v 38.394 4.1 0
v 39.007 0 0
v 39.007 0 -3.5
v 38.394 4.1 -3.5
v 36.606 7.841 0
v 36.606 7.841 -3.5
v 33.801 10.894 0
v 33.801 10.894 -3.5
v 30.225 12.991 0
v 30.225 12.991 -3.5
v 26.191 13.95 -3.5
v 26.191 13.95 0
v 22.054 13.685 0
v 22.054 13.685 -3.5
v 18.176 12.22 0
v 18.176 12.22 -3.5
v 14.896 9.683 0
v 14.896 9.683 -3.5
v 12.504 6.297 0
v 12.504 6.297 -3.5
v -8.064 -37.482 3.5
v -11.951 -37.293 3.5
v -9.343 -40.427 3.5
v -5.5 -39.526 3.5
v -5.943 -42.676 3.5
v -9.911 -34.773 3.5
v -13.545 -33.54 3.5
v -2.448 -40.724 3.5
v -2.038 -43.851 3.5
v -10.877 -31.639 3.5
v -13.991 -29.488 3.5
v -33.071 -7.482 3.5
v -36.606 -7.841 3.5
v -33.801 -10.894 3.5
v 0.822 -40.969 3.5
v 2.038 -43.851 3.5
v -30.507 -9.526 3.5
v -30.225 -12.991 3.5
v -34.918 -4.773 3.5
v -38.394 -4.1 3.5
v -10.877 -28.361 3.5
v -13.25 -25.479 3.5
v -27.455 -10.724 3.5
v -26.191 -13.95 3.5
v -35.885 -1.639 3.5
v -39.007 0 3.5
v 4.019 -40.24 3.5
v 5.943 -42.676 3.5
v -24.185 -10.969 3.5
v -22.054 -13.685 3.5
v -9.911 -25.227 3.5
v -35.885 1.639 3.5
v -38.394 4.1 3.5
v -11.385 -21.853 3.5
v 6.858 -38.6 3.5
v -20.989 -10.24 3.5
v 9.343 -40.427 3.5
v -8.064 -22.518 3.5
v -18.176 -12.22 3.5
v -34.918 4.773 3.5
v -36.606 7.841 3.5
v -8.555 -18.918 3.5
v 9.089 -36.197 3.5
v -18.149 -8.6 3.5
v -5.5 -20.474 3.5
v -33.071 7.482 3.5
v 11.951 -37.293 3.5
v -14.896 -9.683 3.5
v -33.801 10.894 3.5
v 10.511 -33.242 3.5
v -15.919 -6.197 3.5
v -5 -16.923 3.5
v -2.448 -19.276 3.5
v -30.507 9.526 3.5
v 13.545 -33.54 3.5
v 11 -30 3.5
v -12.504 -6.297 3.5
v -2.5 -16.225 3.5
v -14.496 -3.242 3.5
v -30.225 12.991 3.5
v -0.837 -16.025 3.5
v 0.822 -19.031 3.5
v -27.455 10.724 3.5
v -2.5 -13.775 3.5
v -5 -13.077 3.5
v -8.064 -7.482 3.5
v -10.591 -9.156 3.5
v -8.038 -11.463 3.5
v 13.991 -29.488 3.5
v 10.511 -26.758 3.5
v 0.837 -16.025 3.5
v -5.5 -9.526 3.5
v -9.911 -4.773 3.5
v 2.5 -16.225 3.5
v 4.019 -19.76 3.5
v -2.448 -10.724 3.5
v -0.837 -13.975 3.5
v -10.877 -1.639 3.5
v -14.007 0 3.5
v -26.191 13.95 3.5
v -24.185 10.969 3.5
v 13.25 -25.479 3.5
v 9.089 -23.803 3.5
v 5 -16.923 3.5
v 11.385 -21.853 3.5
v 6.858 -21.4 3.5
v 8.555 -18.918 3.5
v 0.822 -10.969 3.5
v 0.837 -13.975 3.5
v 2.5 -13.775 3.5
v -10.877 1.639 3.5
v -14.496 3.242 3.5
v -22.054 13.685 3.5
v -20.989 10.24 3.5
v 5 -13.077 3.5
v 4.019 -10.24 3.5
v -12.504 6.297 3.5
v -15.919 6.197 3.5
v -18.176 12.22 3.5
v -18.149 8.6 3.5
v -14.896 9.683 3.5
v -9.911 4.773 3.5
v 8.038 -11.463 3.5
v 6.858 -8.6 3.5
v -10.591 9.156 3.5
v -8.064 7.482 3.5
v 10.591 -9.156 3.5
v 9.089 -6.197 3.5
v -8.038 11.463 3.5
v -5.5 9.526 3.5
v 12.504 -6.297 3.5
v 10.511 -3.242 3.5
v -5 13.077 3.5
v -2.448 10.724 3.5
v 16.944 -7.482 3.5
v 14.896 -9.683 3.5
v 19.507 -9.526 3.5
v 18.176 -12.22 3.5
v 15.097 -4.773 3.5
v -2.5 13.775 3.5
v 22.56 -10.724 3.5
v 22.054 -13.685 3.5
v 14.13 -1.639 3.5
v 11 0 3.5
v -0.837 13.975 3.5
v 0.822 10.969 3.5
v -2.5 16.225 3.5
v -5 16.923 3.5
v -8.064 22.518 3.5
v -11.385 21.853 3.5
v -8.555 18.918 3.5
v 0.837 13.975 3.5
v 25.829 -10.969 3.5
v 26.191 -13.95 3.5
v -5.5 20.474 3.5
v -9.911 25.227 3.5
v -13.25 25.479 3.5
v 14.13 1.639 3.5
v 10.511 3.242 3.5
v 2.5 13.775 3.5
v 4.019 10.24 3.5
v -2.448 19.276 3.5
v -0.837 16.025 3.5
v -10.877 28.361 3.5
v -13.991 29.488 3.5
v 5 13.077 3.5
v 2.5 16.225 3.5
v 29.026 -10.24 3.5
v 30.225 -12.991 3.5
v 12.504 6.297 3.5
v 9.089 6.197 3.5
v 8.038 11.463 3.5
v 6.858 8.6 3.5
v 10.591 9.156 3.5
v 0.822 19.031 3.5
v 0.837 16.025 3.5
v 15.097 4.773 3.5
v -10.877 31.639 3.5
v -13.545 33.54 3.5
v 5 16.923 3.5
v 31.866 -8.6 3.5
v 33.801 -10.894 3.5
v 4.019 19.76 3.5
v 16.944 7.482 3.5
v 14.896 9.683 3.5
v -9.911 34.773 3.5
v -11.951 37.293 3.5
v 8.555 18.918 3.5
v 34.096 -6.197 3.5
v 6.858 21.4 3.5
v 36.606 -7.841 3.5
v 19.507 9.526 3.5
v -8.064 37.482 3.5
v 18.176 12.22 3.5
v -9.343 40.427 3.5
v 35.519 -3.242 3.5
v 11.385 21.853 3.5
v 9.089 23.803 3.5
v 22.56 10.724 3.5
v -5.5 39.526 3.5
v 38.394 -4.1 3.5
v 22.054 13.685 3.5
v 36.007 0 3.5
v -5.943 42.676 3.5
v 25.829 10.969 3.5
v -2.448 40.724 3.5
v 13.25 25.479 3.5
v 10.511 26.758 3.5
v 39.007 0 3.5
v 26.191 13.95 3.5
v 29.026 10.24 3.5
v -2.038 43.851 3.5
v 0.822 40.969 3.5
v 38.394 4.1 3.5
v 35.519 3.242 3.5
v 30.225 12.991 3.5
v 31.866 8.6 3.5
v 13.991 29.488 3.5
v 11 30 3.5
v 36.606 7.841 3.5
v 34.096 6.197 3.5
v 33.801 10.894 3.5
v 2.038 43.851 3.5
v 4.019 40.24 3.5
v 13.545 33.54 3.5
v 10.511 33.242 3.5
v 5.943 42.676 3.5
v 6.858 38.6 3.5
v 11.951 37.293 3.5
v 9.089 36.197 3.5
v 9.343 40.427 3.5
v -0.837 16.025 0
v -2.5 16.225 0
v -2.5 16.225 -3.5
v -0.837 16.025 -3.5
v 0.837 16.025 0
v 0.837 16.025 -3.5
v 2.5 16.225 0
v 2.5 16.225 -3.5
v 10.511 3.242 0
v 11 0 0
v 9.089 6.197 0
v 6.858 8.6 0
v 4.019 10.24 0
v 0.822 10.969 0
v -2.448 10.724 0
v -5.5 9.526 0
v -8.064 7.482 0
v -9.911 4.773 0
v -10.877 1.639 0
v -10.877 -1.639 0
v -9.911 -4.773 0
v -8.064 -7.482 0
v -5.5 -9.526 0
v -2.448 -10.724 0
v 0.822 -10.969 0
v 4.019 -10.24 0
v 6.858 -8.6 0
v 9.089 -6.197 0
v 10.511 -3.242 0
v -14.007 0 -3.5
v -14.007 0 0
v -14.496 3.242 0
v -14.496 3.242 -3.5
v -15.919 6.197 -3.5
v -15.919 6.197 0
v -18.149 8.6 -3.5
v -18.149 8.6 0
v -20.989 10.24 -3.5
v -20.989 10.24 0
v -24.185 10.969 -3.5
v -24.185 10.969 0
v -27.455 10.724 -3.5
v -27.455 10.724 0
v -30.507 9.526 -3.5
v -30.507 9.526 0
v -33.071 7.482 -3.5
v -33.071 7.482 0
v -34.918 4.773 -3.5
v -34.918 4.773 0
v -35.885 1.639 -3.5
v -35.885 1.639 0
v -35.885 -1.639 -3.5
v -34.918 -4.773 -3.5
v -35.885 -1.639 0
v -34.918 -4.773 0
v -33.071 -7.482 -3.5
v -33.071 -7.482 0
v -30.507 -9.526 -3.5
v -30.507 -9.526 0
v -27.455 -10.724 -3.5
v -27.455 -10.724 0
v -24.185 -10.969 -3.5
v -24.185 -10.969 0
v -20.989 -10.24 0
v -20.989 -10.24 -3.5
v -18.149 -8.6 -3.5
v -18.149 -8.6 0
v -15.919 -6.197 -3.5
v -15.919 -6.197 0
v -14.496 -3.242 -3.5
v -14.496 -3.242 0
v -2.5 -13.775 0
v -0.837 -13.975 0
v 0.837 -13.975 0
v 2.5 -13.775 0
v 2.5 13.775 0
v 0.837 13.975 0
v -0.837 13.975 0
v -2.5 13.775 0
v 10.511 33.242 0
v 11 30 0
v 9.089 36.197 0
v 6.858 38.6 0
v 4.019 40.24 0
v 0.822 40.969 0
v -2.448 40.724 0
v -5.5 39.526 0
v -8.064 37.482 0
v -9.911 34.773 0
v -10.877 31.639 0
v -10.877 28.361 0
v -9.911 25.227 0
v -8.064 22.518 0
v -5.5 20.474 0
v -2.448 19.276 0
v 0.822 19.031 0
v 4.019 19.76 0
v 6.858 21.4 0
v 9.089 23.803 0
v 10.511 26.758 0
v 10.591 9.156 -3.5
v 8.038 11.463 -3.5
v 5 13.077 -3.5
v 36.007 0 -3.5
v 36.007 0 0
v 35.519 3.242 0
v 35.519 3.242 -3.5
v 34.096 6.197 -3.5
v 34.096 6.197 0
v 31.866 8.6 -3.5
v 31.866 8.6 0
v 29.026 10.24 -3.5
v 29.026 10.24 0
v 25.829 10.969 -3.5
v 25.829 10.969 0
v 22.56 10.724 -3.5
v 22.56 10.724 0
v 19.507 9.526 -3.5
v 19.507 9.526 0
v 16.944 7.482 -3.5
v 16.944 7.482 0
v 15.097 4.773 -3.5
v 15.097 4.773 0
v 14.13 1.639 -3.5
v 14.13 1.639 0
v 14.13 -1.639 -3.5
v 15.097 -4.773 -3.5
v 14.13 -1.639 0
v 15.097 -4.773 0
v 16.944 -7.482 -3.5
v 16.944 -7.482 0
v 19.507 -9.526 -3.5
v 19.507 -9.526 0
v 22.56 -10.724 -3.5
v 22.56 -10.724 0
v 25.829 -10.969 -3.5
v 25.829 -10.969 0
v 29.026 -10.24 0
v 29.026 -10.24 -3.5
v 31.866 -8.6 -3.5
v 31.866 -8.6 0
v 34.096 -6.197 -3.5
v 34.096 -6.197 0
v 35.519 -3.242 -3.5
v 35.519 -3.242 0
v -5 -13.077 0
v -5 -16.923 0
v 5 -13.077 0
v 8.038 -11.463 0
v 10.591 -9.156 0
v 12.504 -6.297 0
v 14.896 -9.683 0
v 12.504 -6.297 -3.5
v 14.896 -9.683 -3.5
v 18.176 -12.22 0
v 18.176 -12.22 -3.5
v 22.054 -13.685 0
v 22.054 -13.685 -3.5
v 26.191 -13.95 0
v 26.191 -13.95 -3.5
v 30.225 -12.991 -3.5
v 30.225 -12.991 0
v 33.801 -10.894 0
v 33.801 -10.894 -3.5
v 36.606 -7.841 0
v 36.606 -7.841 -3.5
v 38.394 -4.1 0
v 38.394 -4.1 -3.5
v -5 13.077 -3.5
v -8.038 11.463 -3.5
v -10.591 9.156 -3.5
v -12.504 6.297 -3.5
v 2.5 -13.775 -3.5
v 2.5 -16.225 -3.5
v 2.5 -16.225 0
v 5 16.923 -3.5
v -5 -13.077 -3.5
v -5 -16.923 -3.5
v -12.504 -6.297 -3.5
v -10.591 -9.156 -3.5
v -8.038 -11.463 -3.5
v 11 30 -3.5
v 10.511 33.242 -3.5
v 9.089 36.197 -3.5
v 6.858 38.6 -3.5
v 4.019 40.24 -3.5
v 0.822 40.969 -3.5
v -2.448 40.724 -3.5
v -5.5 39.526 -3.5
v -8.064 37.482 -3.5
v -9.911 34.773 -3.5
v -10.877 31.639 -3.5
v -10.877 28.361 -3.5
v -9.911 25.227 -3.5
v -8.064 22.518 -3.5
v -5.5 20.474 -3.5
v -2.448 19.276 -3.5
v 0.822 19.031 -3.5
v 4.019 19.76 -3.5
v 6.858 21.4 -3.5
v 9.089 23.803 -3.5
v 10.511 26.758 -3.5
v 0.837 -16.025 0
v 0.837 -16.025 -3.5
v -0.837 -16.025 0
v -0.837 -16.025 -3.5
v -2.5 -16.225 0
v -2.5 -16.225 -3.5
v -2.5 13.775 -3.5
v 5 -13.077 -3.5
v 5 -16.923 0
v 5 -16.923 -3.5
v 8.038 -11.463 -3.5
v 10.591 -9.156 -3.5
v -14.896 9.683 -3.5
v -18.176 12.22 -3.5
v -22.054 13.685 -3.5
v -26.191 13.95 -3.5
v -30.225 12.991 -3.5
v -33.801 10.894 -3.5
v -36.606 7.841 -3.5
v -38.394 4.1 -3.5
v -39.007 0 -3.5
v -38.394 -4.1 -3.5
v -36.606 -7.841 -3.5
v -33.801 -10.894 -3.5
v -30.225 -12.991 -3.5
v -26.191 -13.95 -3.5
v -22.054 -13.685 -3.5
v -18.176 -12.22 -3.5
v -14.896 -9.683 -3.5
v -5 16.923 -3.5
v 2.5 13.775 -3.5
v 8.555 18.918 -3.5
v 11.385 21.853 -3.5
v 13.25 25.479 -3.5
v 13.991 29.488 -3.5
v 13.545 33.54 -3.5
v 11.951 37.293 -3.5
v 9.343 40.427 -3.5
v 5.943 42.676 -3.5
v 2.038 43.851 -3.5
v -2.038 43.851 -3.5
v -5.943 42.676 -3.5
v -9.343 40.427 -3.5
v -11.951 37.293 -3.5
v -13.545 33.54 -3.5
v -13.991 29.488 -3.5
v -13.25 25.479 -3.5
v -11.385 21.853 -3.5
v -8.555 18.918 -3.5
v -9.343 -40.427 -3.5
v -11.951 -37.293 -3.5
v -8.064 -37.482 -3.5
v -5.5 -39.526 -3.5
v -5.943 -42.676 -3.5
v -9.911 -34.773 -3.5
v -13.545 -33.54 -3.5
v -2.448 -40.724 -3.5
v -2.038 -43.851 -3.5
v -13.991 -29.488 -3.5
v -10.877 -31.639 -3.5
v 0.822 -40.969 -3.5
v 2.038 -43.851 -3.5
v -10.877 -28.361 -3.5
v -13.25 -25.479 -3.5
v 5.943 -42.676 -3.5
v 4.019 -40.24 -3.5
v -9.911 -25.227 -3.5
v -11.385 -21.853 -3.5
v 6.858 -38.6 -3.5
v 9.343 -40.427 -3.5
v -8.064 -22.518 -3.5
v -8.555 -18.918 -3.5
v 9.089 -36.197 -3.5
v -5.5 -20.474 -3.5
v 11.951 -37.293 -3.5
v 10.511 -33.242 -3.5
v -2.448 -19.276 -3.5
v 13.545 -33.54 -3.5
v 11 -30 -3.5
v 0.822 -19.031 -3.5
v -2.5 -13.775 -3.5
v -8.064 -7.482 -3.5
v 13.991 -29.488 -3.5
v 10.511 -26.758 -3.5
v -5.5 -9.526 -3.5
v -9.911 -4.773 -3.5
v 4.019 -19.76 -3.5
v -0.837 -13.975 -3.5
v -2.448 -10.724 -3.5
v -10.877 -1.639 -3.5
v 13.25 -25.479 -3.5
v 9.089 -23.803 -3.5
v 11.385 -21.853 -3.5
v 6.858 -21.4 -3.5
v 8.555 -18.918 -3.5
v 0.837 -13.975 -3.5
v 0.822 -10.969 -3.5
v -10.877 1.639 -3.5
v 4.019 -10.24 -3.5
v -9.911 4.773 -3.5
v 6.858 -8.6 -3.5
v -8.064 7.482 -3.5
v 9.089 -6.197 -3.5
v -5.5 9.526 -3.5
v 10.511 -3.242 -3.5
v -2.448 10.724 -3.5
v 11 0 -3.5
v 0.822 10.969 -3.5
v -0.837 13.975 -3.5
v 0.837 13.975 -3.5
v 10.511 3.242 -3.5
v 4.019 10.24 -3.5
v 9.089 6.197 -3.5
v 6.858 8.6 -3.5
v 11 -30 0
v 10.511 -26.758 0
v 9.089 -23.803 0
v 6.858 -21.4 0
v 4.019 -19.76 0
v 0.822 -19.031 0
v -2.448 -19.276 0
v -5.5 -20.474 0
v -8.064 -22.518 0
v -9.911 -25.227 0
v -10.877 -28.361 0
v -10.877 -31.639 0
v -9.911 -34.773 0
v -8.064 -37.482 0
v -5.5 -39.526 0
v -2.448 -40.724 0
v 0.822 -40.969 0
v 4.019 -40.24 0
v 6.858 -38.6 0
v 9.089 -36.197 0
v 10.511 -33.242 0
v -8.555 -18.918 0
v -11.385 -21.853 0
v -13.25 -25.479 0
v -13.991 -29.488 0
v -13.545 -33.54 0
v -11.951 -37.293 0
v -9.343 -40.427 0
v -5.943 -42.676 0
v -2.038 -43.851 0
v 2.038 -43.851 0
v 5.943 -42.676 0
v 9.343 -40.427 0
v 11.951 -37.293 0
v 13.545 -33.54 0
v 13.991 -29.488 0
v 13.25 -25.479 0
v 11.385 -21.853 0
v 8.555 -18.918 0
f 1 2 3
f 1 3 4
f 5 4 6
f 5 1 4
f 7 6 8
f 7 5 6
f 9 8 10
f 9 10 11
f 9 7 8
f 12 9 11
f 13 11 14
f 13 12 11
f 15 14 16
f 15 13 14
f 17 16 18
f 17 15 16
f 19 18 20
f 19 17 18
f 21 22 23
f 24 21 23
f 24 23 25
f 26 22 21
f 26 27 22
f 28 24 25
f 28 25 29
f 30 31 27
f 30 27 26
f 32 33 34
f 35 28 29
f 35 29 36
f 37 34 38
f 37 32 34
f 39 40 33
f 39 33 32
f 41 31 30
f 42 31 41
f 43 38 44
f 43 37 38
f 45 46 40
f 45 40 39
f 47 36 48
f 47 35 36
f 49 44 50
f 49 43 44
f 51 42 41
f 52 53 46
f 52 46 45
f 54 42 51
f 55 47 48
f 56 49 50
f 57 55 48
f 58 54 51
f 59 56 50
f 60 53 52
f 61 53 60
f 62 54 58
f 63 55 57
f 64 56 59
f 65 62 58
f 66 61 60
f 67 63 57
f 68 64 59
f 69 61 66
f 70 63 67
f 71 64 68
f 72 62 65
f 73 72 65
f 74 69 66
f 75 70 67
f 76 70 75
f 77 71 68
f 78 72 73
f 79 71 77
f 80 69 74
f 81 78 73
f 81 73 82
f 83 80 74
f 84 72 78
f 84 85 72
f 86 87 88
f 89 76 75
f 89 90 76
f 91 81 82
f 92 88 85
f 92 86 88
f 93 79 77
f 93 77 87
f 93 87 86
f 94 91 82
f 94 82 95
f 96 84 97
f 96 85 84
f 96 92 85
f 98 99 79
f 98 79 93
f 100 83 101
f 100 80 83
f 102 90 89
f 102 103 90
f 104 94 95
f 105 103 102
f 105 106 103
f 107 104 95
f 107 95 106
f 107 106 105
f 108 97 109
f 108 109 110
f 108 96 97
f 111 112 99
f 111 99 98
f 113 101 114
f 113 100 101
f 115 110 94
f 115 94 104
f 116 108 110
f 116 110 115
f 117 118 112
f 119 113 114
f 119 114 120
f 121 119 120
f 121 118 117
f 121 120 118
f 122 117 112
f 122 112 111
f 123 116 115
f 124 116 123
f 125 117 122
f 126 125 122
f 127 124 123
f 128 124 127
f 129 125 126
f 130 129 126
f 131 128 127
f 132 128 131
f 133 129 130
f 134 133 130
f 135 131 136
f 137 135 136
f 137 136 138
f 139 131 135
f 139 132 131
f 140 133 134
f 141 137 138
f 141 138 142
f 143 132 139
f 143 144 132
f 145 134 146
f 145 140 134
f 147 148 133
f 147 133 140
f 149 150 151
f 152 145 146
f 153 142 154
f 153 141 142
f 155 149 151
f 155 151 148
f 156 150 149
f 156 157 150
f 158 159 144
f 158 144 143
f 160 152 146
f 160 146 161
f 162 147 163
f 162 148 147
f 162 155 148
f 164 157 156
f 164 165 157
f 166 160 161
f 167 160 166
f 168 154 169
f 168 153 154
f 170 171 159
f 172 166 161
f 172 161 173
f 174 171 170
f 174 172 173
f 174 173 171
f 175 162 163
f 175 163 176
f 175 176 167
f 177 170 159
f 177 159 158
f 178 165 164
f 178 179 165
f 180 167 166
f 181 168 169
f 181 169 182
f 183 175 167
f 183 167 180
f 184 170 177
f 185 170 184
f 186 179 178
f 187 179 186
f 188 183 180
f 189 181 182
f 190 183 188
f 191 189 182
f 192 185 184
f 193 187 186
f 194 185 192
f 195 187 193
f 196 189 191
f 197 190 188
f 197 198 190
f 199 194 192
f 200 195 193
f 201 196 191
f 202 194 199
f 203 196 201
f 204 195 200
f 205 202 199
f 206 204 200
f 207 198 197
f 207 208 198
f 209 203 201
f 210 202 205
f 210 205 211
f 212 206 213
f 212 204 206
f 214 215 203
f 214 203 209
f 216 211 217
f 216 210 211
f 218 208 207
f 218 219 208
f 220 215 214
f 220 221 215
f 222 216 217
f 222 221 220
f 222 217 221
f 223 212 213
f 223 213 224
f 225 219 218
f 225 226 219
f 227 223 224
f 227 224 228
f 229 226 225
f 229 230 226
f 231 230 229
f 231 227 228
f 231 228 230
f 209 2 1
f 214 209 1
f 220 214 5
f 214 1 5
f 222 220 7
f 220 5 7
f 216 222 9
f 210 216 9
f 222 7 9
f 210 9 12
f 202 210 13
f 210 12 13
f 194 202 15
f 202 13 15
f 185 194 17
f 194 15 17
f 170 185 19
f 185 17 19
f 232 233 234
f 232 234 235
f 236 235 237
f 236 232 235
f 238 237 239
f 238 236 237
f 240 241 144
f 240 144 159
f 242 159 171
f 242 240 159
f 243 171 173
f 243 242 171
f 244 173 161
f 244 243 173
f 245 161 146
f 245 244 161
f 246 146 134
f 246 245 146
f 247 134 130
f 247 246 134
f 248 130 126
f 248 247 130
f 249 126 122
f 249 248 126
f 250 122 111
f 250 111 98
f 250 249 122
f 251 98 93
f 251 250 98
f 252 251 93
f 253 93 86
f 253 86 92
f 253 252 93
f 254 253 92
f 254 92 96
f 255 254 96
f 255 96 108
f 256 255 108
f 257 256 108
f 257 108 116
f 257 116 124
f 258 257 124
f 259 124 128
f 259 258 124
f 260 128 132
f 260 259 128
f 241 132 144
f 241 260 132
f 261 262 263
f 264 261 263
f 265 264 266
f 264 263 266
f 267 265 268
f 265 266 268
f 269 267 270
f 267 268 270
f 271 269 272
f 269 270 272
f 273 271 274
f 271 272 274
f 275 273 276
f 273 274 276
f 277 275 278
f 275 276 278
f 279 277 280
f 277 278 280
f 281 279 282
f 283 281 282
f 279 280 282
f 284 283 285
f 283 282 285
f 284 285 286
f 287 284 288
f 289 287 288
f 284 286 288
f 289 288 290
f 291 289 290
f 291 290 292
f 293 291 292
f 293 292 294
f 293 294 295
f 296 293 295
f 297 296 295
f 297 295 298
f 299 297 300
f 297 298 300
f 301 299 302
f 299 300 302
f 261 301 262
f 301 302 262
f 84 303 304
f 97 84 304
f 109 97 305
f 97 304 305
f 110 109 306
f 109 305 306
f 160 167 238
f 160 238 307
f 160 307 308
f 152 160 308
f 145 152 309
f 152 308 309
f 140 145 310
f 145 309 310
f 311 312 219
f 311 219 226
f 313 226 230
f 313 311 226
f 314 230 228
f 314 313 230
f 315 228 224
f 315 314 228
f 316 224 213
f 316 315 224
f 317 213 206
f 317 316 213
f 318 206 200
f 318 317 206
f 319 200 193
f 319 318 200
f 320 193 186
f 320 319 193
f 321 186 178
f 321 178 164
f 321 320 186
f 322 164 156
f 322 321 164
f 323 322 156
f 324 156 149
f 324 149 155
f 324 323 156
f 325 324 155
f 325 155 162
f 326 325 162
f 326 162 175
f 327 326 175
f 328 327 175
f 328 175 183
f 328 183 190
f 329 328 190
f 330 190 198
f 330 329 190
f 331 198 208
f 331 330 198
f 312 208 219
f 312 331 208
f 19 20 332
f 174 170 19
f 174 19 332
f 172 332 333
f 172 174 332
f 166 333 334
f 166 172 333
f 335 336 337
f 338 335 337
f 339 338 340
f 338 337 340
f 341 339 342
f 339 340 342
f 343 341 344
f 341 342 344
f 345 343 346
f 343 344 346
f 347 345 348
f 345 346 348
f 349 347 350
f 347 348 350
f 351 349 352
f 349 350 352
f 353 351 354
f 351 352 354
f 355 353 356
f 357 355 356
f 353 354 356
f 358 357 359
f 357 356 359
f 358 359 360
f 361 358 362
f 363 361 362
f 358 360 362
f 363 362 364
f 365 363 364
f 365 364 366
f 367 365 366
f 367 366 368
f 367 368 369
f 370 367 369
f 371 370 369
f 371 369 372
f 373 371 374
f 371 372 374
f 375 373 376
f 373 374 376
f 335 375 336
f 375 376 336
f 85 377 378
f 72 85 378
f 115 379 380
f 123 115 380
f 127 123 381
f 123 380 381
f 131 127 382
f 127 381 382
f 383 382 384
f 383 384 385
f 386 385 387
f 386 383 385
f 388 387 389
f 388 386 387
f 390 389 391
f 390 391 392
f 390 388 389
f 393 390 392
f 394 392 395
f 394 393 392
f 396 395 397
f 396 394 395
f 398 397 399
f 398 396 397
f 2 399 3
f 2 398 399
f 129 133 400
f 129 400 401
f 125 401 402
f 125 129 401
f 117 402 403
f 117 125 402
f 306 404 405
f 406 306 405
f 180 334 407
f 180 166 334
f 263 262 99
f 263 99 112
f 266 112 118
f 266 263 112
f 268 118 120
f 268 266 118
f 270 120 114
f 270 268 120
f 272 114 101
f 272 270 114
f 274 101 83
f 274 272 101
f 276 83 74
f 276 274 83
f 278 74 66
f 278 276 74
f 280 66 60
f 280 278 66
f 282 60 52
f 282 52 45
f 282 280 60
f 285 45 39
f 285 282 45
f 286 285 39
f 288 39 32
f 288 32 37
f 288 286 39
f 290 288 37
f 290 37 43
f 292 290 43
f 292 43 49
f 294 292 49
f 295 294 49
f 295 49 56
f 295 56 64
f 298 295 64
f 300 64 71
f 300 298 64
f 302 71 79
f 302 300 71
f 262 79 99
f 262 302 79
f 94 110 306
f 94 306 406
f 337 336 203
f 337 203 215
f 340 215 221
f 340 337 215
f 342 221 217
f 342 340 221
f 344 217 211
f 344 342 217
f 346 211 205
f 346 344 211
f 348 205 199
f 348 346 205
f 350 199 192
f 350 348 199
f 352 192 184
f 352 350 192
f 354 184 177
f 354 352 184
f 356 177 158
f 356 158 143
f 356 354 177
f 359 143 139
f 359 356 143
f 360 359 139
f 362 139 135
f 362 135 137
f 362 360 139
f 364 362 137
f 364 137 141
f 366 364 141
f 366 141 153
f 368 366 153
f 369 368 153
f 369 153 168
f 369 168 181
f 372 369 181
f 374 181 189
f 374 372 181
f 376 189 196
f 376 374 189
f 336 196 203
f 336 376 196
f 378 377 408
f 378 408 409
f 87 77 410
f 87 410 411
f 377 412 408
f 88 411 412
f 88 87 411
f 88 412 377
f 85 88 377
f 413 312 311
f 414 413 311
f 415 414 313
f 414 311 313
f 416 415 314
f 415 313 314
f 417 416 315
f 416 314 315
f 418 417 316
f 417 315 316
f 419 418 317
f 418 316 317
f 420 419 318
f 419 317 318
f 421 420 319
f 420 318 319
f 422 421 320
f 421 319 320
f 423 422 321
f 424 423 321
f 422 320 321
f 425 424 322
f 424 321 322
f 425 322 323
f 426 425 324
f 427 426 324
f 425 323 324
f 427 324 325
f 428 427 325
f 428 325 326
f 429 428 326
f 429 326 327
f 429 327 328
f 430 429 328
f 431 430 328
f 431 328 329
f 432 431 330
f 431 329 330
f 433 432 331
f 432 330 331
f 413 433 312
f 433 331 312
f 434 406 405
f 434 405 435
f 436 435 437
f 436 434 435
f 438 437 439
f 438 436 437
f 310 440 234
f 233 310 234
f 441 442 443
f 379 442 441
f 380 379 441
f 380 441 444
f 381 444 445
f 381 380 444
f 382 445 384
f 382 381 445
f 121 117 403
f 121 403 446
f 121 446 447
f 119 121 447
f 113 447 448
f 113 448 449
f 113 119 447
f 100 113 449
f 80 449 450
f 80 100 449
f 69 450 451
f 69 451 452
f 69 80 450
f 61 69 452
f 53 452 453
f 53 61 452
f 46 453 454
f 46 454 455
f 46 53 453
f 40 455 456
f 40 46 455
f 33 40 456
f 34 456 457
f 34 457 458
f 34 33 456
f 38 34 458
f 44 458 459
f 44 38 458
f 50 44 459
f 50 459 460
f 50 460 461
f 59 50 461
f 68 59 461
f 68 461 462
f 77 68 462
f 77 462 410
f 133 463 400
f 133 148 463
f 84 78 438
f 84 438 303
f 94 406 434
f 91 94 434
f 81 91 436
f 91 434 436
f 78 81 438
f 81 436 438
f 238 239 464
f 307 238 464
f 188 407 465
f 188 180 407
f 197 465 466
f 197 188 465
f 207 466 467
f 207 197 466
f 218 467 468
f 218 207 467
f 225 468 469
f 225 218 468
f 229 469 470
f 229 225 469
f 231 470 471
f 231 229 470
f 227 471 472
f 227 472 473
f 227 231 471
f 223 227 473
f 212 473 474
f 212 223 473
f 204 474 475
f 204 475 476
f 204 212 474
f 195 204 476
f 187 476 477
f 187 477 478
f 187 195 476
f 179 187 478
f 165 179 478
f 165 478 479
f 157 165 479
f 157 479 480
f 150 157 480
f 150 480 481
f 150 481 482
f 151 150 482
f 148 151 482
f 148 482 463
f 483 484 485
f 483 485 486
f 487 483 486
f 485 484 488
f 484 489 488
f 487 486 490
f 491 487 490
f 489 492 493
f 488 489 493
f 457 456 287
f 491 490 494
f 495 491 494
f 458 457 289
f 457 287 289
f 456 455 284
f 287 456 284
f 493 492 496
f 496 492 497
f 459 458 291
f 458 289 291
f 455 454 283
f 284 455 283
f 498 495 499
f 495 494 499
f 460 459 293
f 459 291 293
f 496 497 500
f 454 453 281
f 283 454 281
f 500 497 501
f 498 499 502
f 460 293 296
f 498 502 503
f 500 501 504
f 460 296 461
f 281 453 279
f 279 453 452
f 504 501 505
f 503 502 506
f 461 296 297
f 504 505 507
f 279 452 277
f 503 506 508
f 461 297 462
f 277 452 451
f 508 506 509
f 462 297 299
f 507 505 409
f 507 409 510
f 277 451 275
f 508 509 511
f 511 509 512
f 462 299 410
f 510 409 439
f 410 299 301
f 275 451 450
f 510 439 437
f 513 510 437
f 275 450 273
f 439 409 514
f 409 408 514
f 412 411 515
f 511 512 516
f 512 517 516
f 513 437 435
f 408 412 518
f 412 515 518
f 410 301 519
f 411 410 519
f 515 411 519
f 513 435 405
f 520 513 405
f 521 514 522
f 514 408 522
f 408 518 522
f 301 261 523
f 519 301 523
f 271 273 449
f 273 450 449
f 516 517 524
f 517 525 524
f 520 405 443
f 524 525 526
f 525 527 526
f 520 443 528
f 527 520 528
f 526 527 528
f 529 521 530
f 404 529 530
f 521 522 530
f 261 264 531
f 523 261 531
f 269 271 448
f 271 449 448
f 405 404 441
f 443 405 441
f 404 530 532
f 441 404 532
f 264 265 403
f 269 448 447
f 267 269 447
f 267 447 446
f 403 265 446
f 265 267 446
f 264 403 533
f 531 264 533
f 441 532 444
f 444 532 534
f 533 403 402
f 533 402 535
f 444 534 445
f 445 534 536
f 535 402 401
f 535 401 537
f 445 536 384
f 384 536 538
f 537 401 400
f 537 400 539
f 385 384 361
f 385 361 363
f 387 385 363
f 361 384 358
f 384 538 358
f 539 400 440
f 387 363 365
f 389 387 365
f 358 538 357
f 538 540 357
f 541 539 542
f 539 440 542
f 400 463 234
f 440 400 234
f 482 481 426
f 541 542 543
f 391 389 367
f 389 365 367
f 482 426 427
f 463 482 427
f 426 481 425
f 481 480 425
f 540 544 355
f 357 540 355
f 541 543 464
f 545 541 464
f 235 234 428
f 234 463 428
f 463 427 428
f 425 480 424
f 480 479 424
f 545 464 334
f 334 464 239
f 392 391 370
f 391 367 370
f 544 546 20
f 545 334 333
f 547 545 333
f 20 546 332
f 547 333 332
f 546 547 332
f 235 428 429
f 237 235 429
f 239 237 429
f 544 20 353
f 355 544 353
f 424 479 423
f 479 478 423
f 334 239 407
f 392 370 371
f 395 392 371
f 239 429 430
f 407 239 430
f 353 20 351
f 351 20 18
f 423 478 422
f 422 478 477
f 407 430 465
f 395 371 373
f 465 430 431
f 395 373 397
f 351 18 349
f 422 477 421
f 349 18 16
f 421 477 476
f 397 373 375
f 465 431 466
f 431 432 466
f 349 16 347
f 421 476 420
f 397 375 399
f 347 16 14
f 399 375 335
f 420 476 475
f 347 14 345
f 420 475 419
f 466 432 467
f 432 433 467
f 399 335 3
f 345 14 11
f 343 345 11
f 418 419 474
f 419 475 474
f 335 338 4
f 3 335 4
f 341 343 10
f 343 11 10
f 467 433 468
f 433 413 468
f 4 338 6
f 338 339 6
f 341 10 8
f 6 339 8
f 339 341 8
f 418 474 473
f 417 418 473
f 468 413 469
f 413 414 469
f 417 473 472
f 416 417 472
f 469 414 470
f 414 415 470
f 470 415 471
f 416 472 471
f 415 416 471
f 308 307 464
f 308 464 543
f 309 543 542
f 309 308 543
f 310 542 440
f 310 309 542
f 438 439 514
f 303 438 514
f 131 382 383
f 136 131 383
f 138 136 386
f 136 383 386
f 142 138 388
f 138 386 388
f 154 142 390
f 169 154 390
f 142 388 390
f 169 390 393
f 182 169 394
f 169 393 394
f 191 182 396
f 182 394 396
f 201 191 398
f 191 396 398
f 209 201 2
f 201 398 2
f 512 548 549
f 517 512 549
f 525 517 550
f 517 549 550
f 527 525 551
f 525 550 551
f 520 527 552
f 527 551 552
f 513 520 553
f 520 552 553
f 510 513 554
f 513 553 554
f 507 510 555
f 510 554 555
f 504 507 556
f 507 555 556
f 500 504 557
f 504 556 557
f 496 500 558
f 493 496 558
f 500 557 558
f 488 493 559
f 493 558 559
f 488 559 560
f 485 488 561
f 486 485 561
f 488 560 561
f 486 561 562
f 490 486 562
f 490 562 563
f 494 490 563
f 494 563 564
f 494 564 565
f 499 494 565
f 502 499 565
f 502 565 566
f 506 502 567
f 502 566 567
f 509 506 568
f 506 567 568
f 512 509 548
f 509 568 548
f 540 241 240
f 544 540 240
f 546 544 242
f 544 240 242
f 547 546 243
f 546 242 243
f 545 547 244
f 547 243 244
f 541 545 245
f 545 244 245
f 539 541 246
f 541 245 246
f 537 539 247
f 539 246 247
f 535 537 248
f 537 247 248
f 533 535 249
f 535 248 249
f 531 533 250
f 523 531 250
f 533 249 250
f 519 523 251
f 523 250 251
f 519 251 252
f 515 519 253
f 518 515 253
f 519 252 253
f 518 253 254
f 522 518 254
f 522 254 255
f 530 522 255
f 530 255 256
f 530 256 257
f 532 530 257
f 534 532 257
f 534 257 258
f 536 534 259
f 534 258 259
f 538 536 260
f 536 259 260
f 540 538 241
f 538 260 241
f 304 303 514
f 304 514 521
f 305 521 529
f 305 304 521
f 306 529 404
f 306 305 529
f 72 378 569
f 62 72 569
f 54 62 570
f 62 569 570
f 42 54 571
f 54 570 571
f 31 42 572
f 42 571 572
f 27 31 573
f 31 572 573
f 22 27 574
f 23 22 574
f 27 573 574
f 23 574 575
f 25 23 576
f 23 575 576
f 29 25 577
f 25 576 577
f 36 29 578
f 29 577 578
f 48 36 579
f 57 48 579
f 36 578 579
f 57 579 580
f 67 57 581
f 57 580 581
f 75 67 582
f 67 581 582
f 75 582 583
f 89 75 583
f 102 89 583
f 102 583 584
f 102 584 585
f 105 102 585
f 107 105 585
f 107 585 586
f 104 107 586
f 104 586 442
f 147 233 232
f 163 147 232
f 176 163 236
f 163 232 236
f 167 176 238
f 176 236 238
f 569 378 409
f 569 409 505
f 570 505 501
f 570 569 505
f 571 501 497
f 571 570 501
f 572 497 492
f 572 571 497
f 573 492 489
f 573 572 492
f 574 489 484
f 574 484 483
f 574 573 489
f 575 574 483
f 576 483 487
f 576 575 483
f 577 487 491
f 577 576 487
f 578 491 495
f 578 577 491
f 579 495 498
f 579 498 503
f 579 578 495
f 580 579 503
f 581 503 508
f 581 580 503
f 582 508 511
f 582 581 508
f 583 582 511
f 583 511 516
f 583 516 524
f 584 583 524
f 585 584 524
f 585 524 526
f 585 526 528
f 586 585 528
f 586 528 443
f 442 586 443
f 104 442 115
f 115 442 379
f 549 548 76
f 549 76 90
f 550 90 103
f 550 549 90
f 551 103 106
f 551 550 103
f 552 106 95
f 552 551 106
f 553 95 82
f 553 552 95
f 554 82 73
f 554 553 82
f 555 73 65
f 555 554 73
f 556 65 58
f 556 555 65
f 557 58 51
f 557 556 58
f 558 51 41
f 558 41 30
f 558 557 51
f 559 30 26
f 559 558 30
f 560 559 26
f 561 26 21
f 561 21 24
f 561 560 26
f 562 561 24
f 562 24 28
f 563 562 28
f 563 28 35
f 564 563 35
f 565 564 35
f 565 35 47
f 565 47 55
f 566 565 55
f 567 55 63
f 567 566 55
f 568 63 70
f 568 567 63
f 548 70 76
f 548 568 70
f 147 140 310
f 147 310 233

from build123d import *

# Parameters (mm, degrees)
F0_R     = 11
F1_DEPTH = 3.5


with BuildPart() as f1:
    # F0 (on Top) → F1 (new body, symmetric)
    with BuildSketch(Plane.XY):
        with BuildLine():
            Line((-2.5, 13.774977314), (-2.5, 16.225022686))
            ThreePointArc((-2.5, 16.225022686), (0, 16), (2.5, 16.225022686))
            Line((2.5, 16.225022686), (2.5, 13.774977314))
            ThreePointArc((2.5, 13.774977314), (3.7662181175, 13.483901553), (5, 13.0766968306))
            Line((5, 13.0766968306), (5, 16.9233031694))
            ThreePointArc((5, 16.9233031694), (0, 44), (-5, 16.9233031694))
            Line((-5, 16.9233031694), (-5, 13.0766968306))
            ThreePointArc((-5, 13.0766968306), (-3.7662181175, 13.483901553), (-2.5, 13.774977314))
        make_face()
        with Locations((0, 30)):
            Circle(F0_R, mode=Mode.SUBTRACT)
        with BuildLine():
            ThreePointArc((2.5, 13.774977314), (0, 14), (-2.5, 13.774977314))
            ThreePointArc((-2.5, 13.774977314), (-3.7662181175, 13.483901553), (-5, 13.0766968306))
            ThreePointArc((-5, 13.0766968306), (-9.3853246706, 10.3882472452), (-12.503686361, 6.2974461002))
            ThreePointArc((-12.503686361, 6.2974461002), (-11.3865869691, 3.2363861749), (-11.007372722, 0))
            ThreePointArc((-11.007372722, 0), (-11.3865869691, -3.2363861749), (-12.503686361, -6.2974461002))
            ThreePointArc((-12.503686361, -6.2974461002), (-9.3853246706, -10.3882472452), (-5, -13.0766968306))
            ThreePointArc((-5, -13.0766968306), (-3.7662181175, -13.483901553), (-2.5, -13.774977314))
            ThreePointArc((-2.5, -13.774977314), (0, -14), (2.5, -13.774977314))
            ThreePointArc((2.5, -13.774977314), (3.7662181175, -13.483901553), (5, -13.0766968306))
            ThreePointArc((5, -13.0766968306), (9.3853246706, -10.3882472452), (12.503686361, -6.2974461002))
            ThreePointArc((12.503686361, -6.2974461002), (11.007372722, 0), (12.503686361, 6.2974461002))
            ThreePointArc((12.503686361, 6.2974461002), (9.3853246706, 10.3882472452), (5, 13.0766968306))
            ThreePointArc((5, 13.0766968306), (3.7662181175, 13.483901553), (2.5, 13.774977314))
        make_face()
        Circle(F0_R, mode=Mode.SUBTRACT)
        with BuildLine():
            ThreePointArc((-12.503686361, -6.2974461002), (-14, 0), (-12.503686361, 6.2974461002))
            ThreePointArc((-12.503686361, 6.2974461002), (-39.007372722, 0), (-12.503686361, -6.2974461002))
        make_face()
        with Locations((-25.007372722, 0)):
            Circle(F0_R, mode=Mode.SUBTRACT)
        with BuildLine():
            ThreePointArc((-11.007372722, 0), (-11.3865869691, 3.2363861749), (-12.503686361, 6.2974461002))
            ThreePointArc((-12.503686361, 6.2974461002), (-14, 0), (-12.503686361, -6.2974461002))
            ThreePointArc((-12.503686361, -6.2974461002), (-11.3865869691, -3.2363861749), (-11.007372722, 0))
        make_face()
        with BuildLine():
            ThreePointArc((12.503686361, -6.2974461002), (14, 0), (12.503686361, 6.2974461002))
            ThreePointArc((12.503686361, 6.2974461002), (11.007372722, 0), (12.503686361, -6.2974461002))
        make_face()
        with BuildLine():
            ThreePointArc((39.007372722, 0), (28.2437588969, 13.6207857529), (12.503686361, 6.2974461002))
            ThreePointArc((12.503686361, 6.2974461002), (14, 0), (12.503686361, -6.2974461002))
            ThreePointArc((12.503686361, -6.2974461002), (28.2437588969, -13.6207857529), (39.007372722, 0))
        make_face()
        with Locations((25.007372722, 0)):
            Circle(F0_R, mode=Mode.SUBTRACT)
        with BuildLine():
            ThreePointArc((-2.5, -13.774977314), (-3.7662181175, -13.483901553), (-5, -13.0766968306))
            Line((-5, -13.0766968306), (-5, -16.9233031694))
            ThreePointArc((-5, -16.9233031694), (0, -44), (5, -16.9233031694))
            Line((5, -16.9233031694), (5, -13.0766968306))
            ThreePointArc((5, -13.0766968306), (3.7662181175, -13.483901553), (2.5, -13.774977314))
            Line((2.5, -13.774977314), (2.5, -16.225022686))
            ThreePointArc((2.5, -16.225022686), (0, -16), (-2.5, -16.225022686))
            Line((-2.5, -16.225022686), (-2.5, -13.774977314))
        make_face()
        with Locations((0, -30)):
            Circle(F0_R, mode=Mode.SUBTRACT)
    extrude(amount=F1_DEPTH, both=True)


solid = f1.part
